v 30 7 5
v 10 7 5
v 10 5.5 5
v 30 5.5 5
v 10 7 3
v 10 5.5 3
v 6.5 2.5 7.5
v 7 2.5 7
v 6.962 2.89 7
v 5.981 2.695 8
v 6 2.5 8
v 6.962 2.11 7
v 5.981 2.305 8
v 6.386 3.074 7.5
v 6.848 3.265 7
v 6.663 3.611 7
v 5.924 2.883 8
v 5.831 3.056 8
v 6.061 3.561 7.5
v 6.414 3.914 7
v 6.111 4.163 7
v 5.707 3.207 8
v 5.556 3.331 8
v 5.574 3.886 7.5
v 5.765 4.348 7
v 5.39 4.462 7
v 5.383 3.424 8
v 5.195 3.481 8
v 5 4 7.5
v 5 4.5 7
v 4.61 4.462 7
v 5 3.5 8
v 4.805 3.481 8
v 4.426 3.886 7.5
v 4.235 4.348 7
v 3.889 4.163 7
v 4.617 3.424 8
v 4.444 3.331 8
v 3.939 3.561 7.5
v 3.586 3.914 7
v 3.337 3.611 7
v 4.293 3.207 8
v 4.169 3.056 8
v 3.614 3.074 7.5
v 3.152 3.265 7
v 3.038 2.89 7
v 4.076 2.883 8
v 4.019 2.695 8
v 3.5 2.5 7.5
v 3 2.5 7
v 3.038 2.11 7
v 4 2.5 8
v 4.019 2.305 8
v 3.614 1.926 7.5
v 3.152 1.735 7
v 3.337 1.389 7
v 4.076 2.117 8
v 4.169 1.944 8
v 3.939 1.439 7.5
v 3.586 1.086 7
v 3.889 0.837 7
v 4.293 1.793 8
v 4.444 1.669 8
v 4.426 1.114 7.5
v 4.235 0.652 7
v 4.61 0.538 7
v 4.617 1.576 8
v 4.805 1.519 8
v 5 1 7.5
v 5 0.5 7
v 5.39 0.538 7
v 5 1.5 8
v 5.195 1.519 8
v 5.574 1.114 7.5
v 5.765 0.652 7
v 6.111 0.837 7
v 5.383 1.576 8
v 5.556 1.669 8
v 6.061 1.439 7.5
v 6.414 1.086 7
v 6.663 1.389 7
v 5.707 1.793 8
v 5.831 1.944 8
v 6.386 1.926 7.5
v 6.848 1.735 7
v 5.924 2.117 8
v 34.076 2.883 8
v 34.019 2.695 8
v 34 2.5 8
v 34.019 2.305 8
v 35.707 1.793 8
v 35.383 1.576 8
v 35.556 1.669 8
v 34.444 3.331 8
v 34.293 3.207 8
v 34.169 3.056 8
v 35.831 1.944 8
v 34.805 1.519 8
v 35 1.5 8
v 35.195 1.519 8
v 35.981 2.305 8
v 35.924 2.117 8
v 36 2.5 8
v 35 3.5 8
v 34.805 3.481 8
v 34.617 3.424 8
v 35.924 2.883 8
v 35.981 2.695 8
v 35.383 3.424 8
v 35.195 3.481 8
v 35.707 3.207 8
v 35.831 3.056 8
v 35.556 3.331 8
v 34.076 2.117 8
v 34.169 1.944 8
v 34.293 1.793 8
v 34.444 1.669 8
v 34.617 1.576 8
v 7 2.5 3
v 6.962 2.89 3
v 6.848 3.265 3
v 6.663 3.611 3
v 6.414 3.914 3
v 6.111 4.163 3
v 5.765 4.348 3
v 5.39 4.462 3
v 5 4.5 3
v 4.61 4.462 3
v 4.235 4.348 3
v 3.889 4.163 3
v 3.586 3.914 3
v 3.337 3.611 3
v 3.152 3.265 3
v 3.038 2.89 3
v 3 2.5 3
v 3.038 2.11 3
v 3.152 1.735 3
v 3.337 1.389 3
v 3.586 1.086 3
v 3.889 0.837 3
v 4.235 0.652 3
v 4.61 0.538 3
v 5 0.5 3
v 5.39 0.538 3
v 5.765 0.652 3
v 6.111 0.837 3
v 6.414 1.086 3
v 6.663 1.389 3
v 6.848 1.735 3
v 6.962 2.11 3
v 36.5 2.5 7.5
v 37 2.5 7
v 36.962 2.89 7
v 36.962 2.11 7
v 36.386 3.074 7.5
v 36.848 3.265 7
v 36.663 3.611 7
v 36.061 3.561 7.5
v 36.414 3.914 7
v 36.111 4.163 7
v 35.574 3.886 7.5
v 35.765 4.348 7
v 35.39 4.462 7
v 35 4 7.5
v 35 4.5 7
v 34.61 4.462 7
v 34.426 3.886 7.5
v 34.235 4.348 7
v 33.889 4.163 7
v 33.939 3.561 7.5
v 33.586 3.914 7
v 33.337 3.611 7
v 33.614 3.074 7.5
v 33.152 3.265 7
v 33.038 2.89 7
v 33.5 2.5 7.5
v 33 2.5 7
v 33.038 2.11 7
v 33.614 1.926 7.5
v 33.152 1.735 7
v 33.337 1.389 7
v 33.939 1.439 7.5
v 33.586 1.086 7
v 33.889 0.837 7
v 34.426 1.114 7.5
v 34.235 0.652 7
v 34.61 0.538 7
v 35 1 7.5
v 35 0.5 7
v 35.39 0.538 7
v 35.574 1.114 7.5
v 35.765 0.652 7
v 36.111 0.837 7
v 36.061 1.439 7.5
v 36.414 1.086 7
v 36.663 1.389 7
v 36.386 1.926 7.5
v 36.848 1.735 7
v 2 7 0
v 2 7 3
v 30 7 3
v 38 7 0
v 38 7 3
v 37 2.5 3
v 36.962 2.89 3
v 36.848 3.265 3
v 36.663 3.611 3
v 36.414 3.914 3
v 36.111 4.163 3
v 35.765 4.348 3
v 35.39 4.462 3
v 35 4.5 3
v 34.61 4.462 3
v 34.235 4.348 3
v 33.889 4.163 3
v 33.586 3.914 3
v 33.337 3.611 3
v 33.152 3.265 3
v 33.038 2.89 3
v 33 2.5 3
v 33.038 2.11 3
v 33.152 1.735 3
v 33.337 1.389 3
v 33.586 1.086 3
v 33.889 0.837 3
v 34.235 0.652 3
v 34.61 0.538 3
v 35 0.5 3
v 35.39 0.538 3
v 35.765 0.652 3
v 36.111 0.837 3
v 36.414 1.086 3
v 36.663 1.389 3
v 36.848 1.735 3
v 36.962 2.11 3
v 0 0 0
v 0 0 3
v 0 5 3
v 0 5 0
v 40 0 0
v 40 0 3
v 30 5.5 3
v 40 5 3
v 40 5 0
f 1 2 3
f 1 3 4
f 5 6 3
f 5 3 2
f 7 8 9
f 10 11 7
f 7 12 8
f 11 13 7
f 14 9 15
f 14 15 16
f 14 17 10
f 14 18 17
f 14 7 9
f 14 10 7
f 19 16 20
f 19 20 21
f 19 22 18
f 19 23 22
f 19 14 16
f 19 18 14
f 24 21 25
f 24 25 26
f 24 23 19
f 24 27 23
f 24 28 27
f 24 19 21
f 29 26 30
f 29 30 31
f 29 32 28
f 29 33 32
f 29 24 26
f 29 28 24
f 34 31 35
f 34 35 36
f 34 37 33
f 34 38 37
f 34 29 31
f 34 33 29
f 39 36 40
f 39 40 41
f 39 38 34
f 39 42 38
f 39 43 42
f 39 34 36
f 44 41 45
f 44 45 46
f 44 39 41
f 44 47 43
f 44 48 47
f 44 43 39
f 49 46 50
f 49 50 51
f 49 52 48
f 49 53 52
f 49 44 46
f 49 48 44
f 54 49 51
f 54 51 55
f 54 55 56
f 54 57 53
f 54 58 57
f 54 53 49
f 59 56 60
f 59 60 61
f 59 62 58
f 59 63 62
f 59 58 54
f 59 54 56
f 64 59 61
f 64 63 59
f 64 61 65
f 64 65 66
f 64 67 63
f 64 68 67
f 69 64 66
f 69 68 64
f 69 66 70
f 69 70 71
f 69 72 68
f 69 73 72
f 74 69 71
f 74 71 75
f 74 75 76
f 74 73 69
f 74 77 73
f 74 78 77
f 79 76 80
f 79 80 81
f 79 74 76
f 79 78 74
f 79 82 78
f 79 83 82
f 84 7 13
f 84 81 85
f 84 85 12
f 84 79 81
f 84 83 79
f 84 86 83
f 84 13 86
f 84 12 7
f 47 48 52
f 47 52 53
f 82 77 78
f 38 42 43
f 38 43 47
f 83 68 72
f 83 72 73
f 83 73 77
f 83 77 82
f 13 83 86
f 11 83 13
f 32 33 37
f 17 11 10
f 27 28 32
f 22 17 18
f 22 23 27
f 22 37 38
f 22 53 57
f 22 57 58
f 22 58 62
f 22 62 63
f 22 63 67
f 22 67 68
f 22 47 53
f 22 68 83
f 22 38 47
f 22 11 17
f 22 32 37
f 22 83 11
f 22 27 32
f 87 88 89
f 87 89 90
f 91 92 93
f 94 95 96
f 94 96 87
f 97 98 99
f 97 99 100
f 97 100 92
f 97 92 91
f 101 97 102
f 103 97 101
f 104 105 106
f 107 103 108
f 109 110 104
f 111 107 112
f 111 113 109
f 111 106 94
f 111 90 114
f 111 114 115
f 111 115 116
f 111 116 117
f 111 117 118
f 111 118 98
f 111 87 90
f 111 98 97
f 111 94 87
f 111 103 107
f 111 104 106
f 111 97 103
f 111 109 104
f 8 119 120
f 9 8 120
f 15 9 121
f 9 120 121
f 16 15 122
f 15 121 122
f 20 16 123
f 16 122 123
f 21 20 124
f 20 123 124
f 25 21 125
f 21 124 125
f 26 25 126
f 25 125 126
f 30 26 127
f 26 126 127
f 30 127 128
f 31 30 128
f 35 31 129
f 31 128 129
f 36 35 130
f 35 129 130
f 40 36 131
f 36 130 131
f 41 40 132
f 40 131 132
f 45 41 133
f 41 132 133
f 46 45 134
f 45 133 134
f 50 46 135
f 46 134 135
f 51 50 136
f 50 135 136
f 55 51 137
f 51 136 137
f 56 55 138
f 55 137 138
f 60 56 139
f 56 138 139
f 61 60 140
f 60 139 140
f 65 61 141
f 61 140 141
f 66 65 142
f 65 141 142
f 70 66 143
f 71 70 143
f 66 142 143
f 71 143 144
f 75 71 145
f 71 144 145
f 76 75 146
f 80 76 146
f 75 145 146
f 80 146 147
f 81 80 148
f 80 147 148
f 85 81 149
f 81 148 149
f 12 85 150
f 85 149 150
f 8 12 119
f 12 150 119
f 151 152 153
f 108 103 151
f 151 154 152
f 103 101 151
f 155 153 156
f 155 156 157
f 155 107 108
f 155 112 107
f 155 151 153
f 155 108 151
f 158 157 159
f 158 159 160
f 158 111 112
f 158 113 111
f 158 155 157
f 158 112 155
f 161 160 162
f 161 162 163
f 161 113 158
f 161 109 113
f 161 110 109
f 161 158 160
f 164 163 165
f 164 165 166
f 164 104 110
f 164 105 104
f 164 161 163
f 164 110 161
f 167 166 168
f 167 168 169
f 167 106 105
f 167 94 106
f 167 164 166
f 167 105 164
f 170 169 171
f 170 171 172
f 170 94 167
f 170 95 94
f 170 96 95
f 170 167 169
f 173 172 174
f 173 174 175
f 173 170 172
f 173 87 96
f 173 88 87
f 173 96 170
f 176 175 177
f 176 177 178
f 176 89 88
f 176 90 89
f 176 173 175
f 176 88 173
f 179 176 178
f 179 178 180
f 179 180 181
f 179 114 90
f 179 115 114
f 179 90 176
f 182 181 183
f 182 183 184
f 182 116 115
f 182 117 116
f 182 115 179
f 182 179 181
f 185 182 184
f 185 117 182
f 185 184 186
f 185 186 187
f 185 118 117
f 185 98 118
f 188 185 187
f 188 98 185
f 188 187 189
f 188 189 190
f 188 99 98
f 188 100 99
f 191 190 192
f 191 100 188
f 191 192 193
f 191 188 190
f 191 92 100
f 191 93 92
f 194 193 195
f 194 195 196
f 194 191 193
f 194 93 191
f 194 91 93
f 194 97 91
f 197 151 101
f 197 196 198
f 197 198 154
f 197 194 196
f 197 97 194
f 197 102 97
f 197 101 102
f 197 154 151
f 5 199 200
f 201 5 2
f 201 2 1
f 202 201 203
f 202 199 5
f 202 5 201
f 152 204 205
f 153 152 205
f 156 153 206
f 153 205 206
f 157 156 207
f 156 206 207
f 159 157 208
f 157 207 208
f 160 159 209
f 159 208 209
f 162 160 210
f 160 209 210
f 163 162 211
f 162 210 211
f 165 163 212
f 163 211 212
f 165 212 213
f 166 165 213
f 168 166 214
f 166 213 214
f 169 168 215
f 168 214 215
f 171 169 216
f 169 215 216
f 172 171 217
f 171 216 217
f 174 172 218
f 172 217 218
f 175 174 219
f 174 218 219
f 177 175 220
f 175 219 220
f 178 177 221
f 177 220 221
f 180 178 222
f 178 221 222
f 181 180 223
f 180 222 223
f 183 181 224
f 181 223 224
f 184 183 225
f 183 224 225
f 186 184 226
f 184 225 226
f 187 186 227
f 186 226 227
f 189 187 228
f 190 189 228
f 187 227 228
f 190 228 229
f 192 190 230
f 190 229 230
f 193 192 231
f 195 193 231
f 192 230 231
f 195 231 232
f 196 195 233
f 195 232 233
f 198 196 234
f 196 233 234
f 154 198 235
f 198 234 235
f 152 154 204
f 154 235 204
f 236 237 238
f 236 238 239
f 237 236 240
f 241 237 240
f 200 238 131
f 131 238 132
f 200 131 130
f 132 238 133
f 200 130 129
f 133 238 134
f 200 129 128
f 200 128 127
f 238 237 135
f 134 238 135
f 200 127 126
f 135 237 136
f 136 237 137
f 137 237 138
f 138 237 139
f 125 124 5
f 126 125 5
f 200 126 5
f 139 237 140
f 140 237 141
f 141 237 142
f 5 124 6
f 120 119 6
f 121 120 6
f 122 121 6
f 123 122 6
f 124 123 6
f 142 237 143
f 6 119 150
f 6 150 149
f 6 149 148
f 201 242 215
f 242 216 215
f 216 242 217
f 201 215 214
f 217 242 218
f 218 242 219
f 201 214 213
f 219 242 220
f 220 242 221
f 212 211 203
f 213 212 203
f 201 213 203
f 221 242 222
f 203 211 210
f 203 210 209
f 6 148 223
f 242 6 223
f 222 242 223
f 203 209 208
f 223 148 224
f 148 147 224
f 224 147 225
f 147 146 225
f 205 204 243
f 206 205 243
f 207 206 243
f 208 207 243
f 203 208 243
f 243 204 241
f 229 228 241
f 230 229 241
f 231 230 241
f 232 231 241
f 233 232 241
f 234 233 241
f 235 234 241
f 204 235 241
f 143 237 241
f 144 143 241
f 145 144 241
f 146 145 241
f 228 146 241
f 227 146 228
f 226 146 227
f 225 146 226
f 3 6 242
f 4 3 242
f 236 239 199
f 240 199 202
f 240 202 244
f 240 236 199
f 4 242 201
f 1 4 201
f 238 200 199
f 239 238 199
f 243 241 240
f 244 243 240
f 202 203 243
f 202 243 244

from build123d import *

# Parameters (mm, degrees)
SKETCH_W        = 40
SKETCH_H        = 5
PAD_DEPTH       = 3
SKETCH001_R     = 2
PAD001_DEPTH    = 5
CHAMFER_SIZE    = 1
CHAMFER_FACE8_W = 40
CHAMFER_FACE8_H = 3
PAD002_DEPTH    = 2
CHAMFER001_SIZE = 2
SKETCH002_W     = 20
SKETCH002_H     = 1.5
PAD003_DEPTH    = 2


with BuildPart() as part:
    # Sketch → Pad (new body)
    with BuildSketch(Plane.XY):
        with Locations((20, 2.5)):
            Rectangle(SKETCH_W, SKETCH_H)
    extrude(amount=PAD_DEPTH)

    # Sketch001 (on Face6 of Pad) → Pad001 (join)
    with BuildSketch(Plane.XY.offset(3)):
        with Locations((5, 2.5)):
            Circle(SKETCH001_R)
        with Locations((35, 2.5)):
            Circle(SKETCH001_R)
    extrude(amount=PAD001_DEPTH)

    # Chamfer
    chamfer_edges = [part.edges().sort_by_distance(p)[0] for p in [
        (3, 2.5, 8),
        (33, 2.5, 8),
    ]]
    chamfer(chamfer_edges, length=CHAMFER_SIZE)

    # Chamfer Face8 → Pad002 (add)
    with BuildSketch(Plane(origin=(20, 5, 1.5), x_dir=(1, 0, 0), z_dir=(0, 1, 0))):
        Rectangle(CHAMFER_FACE8_W, CHAMFER_FACE8_H)
    extrude(amount=PAD002_DEPTH)

    # Chamfer001
    chamfer001_edges = [part.edges().sort_by_distance(p)[0] for p in [
        (0, 7, 1.5),
        (40, 7, 1.5),
    ]]
    chamfer(chamfer001_edges, length=CHAMFER001_SIZE)

    # Sketch002 (on Face1 of Chamfer001) → Pad003 (join)
    with BuildSketch(Plane.XY.offset(3)):
        with Locations((20, 6.25)):
            Rectangle(SKETCH002_W, SKETCH002_H)
    extrude(amount=PAD003_DEPTH)


solid = part.part
